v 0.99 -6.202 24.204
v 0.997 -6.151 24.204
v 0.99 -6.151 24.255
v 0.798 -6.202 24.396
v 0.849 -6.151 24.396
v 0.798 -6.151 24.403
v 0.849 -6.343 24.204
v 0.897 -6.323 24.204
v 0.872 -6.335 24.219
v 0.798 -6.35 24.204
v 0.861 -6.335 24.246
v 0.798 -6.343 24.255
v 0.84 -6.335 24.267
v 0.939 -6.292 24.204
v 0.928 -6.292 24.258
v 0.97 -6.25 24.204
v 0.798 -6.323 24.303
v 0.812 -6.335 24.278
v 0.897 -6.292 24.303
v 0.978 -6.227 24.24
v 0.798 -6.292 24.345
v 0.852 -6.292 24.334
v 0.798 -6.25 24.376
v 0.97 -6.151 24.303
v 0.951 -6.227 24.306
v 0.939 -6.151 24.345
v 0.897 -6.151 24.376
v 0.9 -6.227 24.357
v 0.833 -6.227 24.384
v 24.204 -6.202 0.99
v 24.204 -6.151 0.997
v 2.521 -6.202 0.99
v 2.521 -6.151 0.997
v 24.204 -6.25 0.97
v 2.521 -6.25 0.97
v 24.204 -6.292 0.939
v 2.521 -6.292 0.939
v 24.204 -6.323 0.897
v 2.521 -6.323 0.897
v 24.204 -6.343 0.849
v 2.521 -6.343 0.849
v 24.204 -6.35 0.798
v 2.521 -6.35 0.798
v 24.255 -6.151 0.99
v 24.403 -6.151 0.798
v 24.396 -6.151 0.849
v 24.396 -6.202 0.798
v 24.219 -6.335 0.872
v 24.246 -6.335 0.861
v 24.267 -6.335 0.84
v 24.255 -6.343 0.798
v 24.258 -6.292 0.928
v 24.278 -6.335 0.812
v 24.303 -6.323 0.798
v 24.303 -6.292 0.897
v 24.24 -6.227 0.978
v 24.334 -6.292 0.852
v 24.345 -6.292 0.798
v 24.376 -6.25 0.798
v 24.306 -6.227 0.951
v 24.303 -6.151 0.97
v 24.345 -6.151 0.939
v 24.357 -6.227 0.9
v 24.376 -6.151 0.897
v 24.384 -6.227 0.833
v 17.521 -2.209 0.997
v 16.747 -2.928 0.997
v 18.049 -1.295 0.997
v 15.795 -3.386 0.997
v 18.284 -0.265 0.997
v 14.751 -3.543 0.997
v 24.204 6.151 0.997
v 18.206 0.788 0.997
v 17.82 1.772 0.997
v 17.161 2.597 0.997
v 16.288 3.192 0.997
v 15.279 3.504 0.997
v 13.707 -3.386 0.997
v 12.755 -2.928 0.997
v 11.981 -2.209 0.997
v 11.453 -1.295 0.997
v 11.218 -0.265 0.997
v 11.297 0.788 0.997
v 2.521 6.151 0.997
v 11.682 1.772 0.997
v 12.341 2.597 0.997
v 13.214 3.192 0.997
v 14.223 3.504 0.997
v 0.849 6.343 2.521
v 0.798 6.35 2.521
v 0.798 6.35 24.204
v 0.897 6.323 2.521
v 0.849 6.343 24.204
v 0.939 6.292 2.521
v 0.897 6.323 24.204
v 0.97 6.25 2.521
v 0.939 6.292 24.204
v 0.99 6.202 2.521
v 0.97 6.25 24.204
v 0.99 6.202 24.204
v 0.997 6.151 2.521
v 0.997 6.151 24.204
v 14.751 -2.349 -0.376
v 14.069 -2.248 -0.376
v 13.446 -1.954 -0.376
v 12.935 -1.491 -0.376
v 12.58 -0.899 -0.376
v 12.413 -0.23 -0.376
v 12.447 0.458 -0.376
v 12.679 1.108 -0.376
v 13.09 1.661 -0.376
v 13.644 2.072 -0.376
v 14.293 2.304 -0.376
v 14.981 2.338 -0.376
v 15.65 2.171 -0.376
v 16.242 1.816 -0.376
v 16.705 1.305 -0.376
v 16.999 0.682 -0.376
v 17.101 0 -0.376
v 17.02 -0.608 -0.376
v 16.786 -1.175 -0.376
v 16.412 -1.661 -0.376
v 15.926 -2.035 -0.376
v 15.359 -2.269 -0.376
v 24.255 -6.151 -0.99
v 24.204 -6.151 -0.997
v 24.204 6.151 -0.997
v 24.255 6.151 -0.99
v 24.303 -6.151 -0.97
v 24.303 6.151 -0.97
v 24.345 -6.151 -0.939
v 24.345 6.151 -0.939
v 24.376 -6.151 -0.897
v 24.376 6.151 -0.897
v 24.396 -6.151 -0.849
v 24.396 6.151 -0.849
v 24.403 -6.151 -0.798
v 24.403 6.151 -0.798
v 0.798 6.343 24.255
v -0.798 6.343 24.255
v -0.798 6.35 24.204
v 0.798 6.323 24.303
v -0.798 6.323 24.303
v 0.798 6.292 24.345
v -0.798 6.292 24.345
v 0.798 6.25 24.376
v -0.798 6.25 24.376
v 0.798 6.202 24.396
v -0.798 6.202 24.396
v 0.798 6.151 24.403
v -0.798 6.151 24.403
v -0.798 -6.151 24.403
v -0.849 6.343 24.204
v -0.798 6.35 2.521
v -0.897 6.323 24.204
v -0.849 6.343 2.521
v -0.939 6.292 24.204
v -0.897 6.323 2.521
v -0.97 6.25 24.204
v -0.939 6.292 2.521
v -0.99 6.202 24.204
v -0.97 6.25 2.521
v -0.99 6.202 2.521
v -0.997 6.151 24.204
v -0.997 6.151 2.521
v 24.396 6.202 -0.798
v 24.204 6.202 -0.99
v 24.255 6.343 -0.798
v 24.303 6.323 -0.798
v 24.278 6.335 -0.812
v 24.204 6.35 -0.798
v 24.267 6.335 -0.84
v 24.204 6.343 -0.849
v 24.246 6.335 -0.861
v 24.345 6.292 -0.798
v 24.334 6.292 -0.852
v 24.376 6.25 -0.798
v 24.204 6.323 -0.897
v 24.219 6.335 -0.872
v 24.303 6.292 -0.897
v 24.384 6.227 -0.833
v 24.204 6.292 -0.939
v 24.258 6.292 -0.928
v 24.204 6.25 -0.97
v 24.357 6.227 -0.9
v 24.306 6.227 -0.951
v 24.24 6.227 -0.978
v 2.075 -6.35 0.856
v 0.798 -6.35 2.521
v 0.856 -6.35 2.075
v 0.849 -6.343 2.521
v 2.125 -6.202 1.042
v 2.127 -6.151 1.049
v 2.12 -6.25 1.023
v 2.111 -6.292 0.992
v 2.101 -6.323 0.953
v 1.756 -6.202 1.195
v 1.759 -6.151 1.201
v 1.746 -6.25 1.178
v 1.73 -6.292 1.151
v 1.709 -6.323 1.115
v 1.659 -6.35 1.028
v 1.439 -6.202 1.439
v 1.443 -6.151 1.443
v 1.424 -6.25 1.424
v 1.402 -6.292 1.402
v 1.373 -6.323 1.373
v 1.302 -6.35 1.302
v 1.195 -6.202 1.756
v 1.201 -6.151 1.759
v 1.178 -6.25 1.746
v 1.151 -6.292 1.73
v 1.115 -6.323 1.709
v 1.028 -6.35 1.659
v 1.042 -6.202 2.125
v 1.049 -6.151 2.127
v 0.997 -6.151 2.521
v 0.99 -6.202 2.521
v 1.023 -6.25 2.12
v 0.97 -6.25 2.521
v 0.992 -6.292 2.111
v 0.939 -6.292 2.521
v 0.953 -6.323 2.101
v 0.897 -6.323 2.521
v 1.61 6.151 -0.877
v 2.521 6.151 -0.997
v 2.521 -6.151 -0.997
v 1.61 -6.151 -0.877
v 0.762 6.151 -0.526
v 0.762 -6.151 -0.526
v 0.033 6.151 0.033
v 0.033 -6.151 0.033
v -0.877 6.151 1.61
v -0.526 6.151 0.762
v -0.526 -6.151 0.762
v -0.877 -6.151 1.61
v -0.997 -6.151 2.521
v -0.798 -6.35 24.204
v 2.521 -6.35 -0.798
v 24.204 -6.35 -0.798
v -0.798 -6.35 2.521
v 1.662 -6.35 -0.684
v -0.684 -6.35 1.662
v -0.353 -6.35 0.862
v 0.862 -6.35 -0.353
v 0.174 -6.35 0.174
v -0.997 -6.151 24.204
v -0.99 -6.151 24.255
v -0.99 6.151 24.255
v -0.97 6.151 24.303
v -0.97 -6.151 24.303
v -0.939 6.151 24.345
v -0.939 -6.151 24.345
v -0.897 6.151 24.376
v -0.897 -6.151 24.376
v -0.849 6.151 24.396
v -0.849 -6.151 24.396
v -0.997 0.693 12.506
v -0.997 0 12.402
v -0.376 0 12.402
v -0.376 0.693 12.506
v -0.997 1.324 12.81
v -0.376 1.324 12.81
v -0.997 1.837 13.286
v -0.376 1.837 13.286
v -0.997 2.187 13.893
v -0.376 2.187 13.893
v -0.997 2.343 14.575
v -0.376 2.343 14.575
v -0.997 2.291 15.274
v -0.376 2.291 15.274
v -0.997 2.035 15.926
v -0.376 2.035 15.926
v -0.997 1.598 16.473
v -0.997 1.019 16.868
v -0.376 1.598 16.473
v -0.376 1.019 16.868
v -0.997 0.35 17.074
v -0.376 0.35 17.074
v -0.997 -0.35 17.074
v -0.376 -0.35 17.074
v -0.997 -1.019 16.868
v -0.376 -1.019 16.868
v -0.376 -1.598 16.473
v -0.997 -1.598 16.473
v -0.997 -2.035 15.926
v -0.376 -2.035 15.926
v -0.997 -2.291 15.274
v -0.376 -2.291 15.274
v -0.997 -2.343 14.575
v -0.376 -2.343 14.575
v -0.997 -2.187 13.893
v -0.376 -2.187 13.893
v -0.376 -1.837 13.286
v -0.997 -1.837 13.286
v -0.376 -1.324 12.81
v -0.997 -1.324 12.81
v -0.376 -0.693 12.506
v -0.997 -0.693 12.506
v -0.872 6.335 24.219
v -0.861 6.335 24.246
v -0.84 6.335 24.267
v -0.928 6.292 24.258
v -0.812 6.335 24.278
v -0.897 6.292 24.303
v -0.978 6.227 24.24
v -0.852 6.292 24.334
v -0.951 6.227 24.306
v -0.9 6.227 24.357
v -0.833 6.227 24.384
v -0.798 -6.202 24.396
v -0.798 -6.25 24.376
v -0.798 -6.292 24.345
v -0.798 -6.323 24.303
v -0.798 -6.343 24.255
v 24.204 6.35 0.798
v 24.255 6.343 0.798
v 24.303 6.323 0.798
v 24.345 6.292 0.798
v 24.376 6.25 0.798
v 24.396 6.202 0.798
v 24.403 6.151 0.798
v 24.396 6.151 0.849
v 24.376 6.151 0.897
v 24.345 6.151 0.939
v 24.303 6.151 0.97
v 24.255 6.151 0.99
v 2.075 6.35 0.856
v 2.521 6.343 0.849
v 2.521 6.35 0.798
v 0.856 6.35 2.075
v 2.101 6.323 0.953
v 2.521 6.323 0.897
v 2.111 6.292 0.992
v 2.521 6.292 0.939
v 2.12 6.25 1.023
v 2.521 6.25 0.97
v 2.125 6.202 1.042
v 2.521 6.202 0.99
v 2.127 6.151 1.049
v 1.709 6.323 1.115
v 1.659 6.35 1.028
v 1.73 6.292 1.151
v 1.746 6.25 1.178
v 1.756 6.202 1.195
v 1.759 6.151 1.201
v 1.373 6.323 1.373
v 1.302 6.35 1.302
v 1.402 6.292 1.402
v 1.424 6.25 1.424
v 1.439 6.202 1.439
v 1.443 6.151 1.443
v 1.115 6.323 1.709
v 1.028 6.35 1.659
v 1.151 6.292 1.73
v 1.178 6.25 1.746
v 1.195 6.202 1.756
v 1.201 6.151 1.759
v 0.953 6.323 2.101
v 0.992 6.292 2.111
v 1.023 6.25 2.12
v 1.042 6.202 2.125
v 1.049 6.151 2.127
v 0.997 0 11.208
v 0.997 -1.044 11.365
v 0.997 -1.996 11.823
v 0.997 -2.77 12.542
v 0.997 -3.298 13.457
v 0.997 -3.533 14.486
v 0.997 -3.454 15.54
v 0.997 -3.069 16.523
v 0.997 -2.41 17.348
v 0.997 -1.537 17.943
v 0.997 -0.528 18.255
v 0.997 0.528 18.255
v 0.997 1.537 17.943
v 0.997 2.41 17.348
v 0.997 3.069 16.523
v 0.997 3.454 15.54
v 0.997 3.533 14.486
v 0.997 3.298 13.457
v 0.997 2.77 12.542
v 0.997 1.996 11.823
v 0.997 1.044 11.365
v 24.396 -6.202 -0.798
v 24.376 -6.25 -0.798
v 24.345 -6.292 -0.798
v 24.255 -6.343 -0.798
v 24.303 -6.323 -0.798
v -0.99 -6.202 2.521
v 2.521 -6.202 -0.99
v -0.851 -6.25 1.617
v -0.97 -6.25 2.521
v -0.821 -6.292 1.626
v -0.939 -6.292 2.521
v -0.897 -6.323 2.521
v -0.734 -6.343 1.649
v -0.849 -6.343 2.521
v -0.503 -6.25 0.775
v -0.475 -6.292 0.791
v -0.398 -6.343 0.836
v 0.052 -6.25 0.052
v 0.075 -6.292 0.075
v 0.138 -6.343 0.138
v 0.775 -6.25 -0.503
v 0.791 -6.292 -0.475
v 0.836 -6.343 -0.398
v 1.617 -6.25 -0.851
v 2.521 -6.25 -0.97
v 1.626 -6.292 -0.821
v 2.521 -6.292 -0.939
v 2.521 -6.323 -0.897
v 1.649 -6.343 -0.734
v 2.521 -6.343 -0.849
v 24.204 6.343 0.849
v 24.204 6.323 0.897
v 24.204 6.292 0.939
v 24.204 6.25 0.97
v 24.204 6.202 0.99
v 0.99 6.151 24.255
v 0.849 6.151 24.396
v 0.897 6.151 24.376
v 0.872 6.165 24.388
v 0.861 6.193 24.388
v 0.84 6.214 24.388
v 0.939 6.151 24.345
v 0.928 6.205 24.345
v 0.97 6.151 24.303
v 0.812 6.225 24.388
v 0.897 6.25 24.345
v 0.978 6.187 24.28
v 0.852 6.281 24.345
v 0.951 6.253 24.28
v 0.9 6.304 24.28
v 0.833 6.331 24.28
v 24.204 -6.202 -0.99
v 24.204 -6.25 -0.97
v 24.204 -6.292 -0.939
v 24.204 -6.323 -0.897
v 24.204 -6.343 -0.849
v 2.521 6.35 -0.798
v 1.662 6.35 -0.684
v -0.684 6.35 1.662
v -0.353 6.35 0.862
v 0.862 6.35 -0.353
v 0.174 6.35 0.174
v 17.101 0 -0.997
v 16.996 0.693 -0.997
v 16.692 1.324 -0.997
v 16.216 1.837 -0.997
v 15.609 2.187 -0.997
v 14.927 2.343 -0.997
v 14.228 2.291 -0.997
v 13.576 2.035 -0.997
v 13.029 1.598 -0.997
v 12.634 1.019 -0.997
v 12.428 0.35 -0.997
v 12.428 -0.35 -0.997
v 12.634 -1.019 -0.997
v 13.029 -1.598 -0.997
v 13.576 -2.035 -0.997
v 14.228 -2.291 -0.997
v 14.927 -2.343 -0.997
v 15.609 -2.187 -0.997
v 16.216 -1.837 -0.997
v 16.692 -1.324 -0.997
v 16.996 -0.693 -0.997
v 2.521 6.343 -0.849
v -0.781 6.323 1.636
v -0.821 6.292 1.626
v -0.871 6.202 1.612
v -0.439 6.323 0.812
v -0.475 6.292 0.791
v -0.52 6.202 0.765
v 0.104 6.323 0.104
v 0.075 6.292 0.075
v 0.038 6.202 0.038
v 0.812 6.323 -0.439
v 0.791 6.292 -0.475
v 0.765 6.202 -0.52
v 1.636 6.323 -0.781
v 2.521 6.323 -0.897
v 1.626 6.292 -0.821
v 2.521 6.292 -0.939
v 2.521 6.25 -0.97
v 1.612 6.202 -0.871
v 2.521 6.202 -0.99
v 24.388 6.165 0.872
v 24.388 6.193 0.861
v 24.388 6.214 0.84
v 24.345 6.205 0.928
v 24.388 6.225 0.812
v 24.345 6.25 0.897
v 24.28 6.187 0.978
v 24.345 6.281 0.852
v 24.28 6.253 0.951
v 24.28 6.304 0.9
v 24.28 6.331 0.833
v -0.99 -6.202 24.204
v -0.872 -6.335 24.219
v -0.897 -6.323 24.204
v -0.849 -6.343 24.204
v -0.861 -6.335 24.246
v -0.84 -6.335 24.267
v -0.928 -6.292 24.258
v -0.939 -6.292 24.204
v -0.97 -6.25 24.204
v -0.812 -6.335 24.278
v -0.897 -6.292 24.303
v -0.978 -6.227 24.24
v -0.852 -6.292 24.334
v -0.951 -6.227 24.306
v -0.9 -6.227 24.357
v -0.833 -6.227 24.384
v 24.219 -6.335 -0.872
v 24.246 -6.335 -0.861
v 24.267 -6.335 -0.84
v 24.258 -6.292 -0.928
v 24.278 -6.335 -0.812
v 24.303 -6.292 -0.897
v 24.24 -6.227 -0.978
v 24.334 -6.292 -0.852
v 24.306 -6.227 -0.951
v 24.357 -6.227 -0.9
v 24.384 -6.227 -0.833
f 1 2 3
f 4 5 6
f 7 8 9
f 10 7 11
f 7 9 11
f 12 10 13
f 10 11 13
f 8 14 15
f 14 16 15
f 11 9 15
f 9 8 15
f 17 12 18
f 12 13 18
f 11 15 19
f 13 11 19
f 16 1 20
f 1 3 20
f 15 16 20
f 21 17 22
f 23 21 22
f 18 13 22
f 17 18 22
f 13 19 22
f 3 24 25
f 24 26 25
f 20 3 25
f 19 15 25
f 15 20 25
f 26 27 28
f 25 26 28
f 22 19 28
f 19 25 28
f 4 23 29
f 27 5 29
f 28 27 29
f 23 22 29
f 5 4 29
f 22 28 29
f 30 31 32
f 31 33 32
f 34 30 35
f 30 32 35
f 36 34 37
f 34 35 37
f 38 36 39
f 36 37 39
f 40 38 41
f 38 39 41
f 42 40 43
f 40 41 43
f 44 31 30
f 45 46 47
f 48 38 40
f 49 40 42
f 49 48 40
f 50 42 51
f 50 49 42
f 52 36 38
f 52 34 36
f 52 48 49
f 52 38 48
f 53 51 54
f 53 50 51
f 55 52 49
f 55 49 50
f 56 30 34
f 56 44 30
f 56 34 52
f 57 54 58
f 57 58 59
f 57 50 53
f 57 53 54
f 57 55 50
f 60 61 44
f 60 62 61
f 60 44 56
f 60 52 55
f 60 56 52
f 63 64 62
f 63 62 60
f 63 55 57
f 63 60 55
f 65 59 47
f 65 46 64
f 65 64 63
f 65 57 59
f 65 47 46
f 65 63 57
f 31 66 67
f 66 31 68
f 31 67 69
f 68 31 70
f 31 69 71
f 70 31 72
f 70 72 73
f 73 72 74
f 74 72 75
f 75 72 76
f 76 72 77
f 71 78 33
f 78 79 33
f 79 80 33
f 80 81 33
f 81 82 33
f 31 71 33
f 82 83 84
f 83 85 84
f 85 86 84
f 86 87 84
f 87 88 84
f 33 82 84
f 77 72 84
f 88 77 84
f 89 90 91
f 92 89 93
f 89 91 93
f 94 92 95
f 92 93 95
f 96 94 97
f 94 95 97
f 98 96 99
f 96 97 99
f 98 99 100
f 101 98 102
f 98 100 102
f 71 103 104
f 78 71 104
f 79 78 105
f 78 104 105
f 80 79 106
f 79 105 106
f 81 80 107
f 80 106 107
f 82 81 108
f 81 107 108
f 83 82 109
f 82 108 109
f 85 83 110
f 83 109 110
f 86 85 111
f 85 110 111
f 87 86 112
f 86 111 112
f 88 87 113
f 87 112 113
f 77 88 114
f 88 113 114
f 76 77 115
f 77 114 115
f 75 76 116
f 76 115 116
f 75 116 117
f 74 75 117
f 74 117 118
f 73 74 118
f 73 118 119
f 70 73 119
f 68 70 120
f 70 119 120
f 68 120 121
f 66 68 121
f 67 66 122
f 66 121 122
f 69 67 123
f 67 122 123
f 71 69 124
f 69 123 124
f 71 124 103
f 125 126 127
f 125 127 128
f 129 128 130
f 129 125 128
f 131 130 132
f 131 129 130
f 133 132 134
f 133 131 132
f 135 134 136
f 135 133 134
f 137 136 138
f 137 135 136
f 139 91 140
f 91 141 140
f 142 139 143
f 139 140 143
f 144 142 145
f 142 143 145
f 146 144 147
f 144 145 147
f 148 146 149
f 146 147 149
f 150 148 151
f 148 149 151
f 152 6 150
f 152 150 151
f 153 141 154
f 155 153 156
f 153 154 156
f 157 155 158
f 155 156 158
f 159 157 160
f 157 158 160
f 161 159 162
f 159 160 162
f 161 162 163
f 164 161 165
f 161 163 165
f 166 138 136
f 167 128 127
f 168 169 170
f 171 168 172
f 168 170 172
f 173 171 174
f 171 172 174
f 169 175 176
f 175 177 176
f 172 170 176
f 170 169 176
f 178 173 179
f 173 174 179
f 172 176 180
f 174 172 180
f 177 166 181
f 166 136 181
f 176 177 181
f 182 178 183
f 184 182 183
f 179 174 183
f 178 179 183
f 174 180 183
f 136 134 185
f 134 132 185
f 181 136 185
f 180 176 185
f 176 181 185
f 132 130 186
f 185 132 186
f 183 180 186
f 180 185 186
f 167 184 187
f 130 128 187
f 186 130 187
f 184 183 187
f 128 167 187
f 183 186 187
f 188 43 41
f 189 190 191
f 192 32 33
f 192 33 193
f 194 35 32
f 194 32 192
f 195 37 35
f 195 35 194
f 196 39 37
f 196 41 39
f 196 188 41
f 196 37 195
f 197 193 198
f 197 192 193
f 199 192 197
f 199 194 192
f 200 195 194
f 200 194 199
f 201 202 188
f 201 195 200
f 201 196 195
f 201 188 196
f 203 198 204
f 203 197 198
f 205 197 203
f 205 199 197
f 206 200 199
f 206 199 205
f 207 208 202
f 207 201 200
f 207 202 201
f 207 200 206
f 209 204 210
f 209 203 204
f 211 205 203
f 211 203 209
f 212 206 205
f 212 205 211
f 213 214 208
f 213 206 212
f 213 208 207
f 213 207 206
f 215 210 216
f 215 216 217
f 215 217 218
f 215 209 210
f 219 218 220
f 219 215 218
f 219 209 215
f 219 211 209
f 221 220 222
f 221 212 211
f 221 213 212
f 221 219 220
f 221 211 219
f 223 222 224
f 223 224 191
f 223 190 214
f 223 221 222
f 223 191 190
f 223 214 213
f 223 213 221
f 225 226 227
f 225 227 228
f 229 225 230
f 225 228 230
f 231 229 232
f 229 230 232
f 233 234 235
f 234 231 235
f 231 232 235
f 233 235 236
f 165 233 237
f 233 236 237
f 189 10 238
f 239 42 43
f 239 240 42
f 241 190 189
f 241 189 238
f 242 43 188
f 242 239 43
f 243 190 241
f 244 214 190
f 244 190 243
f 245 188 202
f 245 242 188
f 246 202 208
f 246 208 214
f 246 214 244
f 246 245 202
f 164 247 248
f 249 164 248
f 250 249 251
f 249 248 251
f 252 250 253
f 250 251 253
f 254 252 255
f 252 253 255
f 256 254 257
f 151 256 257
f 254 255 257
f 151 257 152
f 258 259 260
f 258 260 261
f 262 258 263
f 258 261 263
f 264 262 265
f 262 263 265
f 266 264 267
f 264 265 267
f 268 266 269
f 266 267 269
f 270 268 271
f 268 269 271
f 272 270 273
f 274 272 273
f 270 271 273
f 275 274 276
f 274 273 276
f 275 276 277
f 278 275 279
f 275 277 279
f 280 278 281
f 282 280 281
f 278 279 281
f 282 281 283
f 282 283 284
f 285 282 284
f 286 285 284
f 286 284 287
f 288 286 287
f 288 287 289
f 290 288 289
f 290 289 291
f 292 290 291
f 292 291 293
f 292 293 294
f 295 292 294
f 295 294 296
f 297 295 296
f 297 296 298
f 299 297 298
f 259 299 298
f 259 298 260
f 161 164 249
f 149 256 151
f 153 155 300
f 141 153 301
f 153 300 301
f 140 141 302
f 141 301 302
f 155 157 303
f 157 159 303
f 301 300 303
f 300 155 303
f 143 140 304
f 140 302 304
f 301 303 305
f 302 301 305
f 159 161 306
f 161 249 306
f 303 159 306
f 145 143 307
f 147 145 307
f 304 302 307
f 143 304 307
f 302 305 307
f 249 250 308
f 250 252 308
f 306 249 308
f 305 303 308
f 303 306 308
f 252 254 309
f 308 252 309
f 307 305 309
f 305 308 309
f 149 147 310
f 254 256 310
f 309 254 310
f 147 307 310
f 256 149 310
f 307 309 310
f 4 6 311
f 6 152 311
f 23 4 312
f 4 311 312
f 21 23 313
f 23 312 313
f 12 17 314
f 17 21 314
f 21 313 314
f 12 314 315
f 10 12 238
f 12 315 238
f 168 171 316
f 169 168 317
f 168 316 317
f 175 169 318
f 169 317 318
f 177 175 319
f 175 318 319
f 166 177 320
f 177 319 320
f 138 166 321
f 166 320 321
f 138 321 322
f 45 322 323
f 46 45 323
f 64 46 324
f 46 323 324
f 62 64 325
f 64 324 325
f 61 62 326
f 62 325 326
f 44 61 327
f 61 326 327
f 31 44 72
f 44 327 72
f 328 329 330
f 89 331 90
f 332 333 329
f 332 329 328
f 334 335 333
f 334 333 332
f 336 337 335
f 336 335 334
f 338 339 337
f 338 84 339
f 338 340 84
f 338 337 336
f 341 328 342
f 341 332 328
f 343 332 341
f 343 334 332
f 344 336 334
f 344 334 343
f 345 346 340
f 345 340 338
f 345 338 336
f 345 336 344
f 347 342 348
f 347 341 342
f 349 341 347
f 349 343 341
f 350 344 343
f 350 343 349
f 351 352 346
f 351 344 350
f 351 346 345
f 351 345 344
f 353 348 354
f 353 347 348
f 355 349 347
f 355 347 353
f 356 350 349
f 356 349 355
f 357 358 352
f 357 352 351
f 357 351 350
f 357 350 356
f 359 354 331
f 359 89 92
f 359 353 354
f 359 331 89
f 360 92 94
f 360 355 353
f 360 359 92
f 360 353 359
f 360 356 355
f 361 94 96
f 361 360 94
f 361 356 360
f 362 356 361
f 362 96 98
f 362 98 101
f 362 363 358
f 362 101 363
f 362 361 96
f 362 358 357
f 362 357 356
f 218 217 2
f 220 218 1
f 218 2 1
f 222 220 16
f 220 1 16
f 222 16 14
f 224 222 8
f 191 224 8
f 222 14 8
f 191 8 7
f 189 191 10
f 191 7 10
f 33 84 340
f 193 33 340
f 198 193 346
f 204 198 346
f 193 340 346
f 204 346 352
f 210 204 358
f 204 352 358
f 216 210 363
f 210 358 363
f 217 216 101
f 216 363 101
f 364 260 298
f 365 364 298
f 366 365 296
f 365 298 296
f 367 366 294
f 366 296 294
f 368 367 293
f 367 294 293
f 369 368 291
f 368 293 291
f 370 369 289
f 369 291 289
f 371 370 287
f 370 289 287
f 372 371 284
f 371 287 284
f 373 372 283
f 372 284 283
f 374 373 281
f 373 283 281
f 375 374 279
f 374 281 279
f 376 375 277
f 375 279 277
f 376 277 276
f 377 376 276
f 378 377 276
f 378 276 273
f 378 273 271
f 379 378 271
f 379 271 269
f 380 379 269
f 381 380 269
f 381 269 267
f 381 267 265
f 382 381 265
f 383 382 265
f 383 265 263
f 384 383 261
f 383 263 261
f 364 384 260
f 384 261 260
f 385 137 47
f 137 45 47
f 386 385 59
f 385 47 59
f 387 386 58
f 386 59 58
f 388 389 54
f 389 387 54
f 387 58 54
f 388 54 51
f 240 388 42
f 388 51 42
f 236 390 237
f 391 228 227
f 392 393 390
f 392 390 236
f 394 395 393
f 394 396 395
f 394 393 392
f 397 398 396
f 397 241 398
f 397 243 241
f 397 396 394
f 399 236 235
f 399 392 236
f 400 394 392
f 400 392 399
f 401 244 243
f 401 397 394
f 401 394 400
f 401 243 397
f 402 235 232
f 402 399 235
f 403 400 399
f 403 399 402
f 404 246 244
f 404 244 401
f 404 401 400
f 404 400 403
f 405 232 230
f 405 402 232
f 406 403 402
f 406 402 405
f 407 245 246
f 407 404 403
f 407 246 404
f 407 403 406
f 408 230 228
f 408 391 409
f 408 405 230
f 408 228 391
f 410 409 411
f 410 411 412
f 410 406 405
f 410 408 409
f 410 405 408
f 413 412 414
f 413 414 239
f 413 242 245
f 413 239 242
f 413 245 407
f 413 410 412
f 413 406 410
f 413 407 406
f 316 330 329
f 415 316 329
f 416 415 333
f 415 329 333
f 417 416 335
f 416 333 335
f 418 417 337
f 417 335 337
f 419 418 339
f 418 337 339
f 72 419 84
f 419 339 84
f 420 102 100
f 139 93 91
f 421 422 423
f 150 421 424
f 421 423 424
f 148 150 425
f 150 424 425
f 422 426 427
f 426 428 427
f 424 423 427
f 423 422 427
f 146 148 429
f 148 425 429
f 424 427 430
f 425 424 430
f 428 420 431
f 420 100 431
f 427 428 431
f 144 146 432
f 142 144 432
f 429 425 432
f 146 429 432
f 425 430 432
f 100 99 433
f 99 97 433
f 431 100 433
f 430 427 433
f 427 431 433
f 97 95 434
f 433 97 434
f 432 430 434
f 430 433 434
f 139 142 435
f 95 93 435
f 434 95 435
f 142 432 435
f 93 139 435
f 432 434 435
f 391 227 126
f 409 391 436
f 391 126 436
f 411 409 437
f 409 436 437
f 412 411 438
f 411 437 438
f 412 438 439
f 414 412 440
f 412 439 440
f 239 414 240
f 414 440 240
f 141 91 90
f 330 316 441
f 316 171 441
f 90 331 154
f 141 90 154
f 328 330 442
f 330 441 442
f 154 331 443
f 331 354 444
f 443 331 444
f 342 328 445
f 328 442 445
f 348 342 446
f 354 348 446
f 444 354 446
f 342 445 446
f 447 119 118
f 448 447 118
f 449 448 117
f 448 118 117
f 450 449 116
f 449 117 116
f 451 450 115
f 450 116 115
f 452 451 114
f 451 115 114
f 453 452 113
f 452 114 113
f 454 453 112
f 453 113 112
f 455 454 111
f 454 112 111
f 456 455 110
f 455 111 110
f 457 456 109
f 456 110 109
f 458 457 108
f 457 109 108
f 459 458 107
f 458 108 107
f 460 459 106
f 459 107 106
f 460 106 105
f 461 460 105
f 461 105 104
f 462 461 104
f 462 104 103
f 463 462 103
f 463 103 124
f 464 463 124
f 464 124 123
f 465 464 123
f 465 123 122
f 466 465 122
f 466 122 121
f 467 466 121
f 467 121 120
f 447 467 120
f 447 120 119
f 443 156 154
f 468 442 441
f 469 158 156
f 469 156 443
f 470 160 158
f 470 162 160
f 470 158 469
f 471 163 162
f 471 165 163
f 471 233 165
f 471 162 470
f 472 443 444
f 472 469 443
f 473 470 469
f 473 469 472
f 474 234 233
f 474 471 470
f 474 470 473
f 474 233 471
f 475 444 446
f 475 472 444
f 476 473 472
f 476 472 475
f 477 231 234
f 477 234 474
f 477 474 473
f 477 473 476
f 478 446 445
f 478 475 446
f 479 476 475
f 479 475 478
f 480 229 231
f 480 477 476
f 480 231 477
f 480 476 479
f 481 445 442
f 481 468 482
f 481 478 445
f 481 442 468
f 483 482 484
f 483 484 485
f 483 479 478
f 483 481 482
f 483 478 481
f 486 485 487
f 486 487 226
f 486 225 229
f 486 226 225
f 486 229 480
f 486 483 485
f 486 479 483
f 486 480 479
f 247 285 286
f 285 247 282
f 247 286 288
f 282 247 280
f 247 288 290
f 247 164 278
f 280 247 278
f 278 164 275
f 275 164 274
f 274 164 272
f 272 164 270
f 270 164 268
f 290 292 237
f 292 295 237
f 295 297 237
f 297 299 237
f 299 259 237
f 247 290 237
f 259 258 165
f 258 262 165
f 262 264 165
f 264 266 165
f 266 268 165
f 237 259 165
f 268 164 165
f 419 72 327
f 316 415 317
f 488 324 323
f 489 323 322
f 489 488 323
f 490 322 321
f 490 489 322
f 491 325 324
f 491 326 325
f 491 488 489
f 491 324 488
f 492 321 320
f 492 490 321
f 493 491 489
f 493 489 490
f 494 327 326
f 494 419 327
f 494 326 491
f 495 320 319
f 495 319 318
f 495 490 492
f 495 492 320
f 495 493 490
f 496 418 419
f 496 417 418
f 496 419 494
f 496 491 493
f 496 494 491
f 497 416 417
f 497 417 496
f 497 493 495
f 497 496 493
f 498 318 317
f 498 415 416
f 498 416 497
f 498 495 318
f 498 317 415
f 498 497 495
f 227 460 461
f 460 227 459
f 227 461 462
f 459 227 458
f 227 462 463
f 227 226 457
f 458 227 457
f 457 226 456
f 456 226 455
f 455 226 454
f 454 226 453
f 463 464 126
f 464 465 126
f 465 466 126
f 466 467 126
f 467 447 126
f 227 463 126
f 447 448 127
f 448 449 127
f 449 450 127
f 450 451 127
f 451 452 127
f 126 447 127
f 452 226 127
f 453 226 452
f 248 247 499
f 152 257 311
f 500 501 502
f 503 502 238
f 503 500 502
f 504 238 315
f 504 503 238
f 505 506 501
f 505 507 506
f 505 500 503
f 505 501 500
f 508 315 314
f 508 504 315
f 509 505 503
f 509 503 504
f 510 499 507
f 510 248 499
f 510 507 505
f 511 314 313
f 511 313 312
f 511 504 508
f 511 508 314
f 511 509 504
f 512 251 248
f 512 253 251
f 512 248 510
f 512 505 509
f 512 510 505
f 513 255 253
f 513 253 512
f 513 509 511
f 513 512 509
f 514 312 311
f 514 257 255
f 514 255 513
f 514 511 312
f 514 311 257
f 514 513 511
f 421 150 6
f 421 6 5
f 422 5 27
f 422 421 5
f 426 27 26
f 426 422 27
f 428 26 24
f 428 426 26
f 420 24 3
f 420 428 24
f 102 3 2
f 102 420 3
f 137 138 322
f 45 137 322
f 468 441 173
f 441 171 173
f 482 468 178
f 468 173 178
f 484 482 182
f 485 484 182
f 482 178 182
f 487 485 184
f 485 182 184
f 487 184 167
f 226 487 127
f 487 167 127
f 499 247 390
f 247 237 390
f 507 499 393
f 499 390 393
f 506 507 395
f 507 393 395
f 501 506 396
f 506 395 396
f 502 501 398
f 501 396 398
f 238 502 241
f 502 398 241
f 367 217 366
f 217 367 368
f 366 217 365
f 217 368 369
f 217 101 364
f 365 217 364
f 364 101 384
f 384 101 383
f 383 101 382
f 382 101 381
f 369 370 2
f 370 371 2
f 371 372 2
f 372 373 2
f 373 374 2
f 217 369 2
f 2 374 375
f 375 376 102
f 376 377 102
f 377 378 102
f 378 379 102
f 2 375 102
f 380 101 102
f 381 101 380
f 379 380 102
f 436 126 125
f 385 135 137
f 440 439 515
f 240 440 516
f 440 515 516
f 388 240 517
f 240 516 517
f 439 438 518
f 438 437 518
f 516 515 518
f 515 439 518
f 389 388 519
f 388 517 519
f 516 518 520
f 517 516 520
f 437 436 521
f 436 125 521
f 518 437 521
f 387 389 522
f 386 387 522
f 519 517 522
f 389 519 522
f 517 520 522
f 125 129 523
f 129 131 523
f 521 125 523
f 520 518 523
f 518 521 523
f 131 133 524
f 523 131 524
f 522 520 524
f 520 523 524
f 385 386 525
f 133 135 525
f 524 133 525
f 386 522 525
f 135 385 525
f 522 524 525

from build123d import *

# Parameters (mm, degrees)
BOSS_EXTRUDE1_DEPTH = 6.35
FILLET1_R           = 1.524
FILLET2_R           = 3.5179
CUT_EXTRUDE1_REACH  = 36.405
SKETCH4_R           = 2.3495
CUT_EXTRUDE3_REACH  = 36.405
SKETCH6_R           = 2.3495
FILLET3_R           = 0.19939


with BuildPart() as part:
    # Sketch3 → Boss-Extrude1 (new, symmetric)
    with BuildSketch(Plane(origin=(0, 0, 0), x_dir=(1, 0, 0), z_dir=(0, 1, 0))):
        Polygon((0.99695, -24.40305), (-0.99695, -24.40305), (-0.99695, 0.99695), (24.40305, 0.99695), (24.40305, -0.99695), (0.99695, -0.99695), align=None)
    extrude(amount=BOSS_EXTRUDE1_DEPTH, both=True)

    # Fillet1
    fillet1_edges = [part.edges().sort_by_distance(p)[0] for p in [
        (0.99695, 0, 0.99695),
    ]]
    fillet(fillet1_edges, radius=FILLET1_R)

    # Fillet2
    fillet2_edges = [part.edges().sort_by_distance(p)[0] for p in [
        (-0.99695, 0, -0.99695),
    ]]
    fillet(fillet2_edges, radius=FILLET2_R)

    # Sketch4 → Cut-Extrude1 (cut, up to next)
    with BuildSketch(Plane.XY.offset(0.99695), mode=Mode.PRIVATE) as cut_extrude1_sk1:
        with Locations((14.75105, 0)):
            Circle(SKETCH4_R)
    cut_extrude1_tool1 = extrude(cut_extrude1_sk1.sketch, amount=-CUT_EXTRUDE1_REACH, mode=Mode.PRIVATE) & part.part
    add(cut_extrude1_tool1.solids().sort_by_distance((14.75105, 0, 0.99695))[0], mode=Mode.SUBTRACT)

    # Cut-Extrude2 cone 1 section (through the dimple's axis) → Cut-Extrude2 (revolve, cut)
    with BuildSketch(Plane(origin=(14.75105, 0, 0.99695), x_dir=(0, -1, 0), z_dir=(1, 0, 0))):
        Polygon((0, 0), (3.5433, 0), (0, 4.076100377), align=None)
    revolve(axis=Axis((14.75105, 0, 0.99695), (0, 0, -1)), mode=Mode.SUBTRACT)

    # Sketch6 → Cut-Extrude3 (cut, up to next)
    with BuildSketch(Plane(origin=(0.99695, 0, 0), x_dir=(0, 0, -1), z_dir=(1, 0, 0)), mode=Mode.PRIVATE) as cut_extrude3_sk1:
        with Locations((-14.75105, 0)):
            Circle(SKETCH6_R)
    cut_extrude3_tool1 = extrude(cut_extrude3_sk1.sketch, amount=-CUT_EXTRUDE3_REACH, mode=Mode.PRIVATE) & part.part
    add(cut_extrude3_tool1.solids().sort_by_distance((0.99695, 0, 14.75105))[0], mode=Mode.SUBTRACT)

    # Cut-Extrude4 cone 1 section (through the dimple's axis) → Cut-Extrude4 (revolve, cut)
    with BuildSketch(Plane(origin=(0.99695, 0, 14.75105), x_dir=(0, 0, -1), z_dir=(0, 1, 0))):
        Polygon((0, 0), (3.5433, 0), (0, 4.076100377), align=None)
    revolve(axis=Axis((0.99695, 0, 14.75105), (-1, 0, 0)), mode=Mode.SUBTRACT)

    # Fillet3
    fillet3_edges = [part.edges().sort_by_distance(p)[0] for p in [
        (0.99695, 6.35, 13.462),
        (24.40305, 0, -0.99695),
        (24.40305, 0, 0.99695),
        (0.99695, 0, 24.40305),
        (-0.99695, 0, 24.40305),
        (24.40305, 6.35, 0),
        (13.462, -6.35, 0.99695),
        (13.462, 6.35, 0.99695),
        (13.462, 6.35, -0.99695),
        (1.443319265, -6.35, 1.443319265),
        (1.443319265, 6.35, 1.443319265),
        (-0.99695, -6.35, 13.462),
        (-0.99695, 6.35, 13.462),
        (0.033419054, -6.35, 0.033419054),
        (0.033419054, 6.35, 0.033419054),
        (13.462, -6.35, -0.99695),
        (24.40305, -6.35, 0),
        (0, 6.35, 24.40305),
        (0.99695, -6.35, 13.462),
        (0, -6.35, 24.40305),
    ]]
    fillet(fillet3_edges, radius=FILLET3_R)


solid = part.part
